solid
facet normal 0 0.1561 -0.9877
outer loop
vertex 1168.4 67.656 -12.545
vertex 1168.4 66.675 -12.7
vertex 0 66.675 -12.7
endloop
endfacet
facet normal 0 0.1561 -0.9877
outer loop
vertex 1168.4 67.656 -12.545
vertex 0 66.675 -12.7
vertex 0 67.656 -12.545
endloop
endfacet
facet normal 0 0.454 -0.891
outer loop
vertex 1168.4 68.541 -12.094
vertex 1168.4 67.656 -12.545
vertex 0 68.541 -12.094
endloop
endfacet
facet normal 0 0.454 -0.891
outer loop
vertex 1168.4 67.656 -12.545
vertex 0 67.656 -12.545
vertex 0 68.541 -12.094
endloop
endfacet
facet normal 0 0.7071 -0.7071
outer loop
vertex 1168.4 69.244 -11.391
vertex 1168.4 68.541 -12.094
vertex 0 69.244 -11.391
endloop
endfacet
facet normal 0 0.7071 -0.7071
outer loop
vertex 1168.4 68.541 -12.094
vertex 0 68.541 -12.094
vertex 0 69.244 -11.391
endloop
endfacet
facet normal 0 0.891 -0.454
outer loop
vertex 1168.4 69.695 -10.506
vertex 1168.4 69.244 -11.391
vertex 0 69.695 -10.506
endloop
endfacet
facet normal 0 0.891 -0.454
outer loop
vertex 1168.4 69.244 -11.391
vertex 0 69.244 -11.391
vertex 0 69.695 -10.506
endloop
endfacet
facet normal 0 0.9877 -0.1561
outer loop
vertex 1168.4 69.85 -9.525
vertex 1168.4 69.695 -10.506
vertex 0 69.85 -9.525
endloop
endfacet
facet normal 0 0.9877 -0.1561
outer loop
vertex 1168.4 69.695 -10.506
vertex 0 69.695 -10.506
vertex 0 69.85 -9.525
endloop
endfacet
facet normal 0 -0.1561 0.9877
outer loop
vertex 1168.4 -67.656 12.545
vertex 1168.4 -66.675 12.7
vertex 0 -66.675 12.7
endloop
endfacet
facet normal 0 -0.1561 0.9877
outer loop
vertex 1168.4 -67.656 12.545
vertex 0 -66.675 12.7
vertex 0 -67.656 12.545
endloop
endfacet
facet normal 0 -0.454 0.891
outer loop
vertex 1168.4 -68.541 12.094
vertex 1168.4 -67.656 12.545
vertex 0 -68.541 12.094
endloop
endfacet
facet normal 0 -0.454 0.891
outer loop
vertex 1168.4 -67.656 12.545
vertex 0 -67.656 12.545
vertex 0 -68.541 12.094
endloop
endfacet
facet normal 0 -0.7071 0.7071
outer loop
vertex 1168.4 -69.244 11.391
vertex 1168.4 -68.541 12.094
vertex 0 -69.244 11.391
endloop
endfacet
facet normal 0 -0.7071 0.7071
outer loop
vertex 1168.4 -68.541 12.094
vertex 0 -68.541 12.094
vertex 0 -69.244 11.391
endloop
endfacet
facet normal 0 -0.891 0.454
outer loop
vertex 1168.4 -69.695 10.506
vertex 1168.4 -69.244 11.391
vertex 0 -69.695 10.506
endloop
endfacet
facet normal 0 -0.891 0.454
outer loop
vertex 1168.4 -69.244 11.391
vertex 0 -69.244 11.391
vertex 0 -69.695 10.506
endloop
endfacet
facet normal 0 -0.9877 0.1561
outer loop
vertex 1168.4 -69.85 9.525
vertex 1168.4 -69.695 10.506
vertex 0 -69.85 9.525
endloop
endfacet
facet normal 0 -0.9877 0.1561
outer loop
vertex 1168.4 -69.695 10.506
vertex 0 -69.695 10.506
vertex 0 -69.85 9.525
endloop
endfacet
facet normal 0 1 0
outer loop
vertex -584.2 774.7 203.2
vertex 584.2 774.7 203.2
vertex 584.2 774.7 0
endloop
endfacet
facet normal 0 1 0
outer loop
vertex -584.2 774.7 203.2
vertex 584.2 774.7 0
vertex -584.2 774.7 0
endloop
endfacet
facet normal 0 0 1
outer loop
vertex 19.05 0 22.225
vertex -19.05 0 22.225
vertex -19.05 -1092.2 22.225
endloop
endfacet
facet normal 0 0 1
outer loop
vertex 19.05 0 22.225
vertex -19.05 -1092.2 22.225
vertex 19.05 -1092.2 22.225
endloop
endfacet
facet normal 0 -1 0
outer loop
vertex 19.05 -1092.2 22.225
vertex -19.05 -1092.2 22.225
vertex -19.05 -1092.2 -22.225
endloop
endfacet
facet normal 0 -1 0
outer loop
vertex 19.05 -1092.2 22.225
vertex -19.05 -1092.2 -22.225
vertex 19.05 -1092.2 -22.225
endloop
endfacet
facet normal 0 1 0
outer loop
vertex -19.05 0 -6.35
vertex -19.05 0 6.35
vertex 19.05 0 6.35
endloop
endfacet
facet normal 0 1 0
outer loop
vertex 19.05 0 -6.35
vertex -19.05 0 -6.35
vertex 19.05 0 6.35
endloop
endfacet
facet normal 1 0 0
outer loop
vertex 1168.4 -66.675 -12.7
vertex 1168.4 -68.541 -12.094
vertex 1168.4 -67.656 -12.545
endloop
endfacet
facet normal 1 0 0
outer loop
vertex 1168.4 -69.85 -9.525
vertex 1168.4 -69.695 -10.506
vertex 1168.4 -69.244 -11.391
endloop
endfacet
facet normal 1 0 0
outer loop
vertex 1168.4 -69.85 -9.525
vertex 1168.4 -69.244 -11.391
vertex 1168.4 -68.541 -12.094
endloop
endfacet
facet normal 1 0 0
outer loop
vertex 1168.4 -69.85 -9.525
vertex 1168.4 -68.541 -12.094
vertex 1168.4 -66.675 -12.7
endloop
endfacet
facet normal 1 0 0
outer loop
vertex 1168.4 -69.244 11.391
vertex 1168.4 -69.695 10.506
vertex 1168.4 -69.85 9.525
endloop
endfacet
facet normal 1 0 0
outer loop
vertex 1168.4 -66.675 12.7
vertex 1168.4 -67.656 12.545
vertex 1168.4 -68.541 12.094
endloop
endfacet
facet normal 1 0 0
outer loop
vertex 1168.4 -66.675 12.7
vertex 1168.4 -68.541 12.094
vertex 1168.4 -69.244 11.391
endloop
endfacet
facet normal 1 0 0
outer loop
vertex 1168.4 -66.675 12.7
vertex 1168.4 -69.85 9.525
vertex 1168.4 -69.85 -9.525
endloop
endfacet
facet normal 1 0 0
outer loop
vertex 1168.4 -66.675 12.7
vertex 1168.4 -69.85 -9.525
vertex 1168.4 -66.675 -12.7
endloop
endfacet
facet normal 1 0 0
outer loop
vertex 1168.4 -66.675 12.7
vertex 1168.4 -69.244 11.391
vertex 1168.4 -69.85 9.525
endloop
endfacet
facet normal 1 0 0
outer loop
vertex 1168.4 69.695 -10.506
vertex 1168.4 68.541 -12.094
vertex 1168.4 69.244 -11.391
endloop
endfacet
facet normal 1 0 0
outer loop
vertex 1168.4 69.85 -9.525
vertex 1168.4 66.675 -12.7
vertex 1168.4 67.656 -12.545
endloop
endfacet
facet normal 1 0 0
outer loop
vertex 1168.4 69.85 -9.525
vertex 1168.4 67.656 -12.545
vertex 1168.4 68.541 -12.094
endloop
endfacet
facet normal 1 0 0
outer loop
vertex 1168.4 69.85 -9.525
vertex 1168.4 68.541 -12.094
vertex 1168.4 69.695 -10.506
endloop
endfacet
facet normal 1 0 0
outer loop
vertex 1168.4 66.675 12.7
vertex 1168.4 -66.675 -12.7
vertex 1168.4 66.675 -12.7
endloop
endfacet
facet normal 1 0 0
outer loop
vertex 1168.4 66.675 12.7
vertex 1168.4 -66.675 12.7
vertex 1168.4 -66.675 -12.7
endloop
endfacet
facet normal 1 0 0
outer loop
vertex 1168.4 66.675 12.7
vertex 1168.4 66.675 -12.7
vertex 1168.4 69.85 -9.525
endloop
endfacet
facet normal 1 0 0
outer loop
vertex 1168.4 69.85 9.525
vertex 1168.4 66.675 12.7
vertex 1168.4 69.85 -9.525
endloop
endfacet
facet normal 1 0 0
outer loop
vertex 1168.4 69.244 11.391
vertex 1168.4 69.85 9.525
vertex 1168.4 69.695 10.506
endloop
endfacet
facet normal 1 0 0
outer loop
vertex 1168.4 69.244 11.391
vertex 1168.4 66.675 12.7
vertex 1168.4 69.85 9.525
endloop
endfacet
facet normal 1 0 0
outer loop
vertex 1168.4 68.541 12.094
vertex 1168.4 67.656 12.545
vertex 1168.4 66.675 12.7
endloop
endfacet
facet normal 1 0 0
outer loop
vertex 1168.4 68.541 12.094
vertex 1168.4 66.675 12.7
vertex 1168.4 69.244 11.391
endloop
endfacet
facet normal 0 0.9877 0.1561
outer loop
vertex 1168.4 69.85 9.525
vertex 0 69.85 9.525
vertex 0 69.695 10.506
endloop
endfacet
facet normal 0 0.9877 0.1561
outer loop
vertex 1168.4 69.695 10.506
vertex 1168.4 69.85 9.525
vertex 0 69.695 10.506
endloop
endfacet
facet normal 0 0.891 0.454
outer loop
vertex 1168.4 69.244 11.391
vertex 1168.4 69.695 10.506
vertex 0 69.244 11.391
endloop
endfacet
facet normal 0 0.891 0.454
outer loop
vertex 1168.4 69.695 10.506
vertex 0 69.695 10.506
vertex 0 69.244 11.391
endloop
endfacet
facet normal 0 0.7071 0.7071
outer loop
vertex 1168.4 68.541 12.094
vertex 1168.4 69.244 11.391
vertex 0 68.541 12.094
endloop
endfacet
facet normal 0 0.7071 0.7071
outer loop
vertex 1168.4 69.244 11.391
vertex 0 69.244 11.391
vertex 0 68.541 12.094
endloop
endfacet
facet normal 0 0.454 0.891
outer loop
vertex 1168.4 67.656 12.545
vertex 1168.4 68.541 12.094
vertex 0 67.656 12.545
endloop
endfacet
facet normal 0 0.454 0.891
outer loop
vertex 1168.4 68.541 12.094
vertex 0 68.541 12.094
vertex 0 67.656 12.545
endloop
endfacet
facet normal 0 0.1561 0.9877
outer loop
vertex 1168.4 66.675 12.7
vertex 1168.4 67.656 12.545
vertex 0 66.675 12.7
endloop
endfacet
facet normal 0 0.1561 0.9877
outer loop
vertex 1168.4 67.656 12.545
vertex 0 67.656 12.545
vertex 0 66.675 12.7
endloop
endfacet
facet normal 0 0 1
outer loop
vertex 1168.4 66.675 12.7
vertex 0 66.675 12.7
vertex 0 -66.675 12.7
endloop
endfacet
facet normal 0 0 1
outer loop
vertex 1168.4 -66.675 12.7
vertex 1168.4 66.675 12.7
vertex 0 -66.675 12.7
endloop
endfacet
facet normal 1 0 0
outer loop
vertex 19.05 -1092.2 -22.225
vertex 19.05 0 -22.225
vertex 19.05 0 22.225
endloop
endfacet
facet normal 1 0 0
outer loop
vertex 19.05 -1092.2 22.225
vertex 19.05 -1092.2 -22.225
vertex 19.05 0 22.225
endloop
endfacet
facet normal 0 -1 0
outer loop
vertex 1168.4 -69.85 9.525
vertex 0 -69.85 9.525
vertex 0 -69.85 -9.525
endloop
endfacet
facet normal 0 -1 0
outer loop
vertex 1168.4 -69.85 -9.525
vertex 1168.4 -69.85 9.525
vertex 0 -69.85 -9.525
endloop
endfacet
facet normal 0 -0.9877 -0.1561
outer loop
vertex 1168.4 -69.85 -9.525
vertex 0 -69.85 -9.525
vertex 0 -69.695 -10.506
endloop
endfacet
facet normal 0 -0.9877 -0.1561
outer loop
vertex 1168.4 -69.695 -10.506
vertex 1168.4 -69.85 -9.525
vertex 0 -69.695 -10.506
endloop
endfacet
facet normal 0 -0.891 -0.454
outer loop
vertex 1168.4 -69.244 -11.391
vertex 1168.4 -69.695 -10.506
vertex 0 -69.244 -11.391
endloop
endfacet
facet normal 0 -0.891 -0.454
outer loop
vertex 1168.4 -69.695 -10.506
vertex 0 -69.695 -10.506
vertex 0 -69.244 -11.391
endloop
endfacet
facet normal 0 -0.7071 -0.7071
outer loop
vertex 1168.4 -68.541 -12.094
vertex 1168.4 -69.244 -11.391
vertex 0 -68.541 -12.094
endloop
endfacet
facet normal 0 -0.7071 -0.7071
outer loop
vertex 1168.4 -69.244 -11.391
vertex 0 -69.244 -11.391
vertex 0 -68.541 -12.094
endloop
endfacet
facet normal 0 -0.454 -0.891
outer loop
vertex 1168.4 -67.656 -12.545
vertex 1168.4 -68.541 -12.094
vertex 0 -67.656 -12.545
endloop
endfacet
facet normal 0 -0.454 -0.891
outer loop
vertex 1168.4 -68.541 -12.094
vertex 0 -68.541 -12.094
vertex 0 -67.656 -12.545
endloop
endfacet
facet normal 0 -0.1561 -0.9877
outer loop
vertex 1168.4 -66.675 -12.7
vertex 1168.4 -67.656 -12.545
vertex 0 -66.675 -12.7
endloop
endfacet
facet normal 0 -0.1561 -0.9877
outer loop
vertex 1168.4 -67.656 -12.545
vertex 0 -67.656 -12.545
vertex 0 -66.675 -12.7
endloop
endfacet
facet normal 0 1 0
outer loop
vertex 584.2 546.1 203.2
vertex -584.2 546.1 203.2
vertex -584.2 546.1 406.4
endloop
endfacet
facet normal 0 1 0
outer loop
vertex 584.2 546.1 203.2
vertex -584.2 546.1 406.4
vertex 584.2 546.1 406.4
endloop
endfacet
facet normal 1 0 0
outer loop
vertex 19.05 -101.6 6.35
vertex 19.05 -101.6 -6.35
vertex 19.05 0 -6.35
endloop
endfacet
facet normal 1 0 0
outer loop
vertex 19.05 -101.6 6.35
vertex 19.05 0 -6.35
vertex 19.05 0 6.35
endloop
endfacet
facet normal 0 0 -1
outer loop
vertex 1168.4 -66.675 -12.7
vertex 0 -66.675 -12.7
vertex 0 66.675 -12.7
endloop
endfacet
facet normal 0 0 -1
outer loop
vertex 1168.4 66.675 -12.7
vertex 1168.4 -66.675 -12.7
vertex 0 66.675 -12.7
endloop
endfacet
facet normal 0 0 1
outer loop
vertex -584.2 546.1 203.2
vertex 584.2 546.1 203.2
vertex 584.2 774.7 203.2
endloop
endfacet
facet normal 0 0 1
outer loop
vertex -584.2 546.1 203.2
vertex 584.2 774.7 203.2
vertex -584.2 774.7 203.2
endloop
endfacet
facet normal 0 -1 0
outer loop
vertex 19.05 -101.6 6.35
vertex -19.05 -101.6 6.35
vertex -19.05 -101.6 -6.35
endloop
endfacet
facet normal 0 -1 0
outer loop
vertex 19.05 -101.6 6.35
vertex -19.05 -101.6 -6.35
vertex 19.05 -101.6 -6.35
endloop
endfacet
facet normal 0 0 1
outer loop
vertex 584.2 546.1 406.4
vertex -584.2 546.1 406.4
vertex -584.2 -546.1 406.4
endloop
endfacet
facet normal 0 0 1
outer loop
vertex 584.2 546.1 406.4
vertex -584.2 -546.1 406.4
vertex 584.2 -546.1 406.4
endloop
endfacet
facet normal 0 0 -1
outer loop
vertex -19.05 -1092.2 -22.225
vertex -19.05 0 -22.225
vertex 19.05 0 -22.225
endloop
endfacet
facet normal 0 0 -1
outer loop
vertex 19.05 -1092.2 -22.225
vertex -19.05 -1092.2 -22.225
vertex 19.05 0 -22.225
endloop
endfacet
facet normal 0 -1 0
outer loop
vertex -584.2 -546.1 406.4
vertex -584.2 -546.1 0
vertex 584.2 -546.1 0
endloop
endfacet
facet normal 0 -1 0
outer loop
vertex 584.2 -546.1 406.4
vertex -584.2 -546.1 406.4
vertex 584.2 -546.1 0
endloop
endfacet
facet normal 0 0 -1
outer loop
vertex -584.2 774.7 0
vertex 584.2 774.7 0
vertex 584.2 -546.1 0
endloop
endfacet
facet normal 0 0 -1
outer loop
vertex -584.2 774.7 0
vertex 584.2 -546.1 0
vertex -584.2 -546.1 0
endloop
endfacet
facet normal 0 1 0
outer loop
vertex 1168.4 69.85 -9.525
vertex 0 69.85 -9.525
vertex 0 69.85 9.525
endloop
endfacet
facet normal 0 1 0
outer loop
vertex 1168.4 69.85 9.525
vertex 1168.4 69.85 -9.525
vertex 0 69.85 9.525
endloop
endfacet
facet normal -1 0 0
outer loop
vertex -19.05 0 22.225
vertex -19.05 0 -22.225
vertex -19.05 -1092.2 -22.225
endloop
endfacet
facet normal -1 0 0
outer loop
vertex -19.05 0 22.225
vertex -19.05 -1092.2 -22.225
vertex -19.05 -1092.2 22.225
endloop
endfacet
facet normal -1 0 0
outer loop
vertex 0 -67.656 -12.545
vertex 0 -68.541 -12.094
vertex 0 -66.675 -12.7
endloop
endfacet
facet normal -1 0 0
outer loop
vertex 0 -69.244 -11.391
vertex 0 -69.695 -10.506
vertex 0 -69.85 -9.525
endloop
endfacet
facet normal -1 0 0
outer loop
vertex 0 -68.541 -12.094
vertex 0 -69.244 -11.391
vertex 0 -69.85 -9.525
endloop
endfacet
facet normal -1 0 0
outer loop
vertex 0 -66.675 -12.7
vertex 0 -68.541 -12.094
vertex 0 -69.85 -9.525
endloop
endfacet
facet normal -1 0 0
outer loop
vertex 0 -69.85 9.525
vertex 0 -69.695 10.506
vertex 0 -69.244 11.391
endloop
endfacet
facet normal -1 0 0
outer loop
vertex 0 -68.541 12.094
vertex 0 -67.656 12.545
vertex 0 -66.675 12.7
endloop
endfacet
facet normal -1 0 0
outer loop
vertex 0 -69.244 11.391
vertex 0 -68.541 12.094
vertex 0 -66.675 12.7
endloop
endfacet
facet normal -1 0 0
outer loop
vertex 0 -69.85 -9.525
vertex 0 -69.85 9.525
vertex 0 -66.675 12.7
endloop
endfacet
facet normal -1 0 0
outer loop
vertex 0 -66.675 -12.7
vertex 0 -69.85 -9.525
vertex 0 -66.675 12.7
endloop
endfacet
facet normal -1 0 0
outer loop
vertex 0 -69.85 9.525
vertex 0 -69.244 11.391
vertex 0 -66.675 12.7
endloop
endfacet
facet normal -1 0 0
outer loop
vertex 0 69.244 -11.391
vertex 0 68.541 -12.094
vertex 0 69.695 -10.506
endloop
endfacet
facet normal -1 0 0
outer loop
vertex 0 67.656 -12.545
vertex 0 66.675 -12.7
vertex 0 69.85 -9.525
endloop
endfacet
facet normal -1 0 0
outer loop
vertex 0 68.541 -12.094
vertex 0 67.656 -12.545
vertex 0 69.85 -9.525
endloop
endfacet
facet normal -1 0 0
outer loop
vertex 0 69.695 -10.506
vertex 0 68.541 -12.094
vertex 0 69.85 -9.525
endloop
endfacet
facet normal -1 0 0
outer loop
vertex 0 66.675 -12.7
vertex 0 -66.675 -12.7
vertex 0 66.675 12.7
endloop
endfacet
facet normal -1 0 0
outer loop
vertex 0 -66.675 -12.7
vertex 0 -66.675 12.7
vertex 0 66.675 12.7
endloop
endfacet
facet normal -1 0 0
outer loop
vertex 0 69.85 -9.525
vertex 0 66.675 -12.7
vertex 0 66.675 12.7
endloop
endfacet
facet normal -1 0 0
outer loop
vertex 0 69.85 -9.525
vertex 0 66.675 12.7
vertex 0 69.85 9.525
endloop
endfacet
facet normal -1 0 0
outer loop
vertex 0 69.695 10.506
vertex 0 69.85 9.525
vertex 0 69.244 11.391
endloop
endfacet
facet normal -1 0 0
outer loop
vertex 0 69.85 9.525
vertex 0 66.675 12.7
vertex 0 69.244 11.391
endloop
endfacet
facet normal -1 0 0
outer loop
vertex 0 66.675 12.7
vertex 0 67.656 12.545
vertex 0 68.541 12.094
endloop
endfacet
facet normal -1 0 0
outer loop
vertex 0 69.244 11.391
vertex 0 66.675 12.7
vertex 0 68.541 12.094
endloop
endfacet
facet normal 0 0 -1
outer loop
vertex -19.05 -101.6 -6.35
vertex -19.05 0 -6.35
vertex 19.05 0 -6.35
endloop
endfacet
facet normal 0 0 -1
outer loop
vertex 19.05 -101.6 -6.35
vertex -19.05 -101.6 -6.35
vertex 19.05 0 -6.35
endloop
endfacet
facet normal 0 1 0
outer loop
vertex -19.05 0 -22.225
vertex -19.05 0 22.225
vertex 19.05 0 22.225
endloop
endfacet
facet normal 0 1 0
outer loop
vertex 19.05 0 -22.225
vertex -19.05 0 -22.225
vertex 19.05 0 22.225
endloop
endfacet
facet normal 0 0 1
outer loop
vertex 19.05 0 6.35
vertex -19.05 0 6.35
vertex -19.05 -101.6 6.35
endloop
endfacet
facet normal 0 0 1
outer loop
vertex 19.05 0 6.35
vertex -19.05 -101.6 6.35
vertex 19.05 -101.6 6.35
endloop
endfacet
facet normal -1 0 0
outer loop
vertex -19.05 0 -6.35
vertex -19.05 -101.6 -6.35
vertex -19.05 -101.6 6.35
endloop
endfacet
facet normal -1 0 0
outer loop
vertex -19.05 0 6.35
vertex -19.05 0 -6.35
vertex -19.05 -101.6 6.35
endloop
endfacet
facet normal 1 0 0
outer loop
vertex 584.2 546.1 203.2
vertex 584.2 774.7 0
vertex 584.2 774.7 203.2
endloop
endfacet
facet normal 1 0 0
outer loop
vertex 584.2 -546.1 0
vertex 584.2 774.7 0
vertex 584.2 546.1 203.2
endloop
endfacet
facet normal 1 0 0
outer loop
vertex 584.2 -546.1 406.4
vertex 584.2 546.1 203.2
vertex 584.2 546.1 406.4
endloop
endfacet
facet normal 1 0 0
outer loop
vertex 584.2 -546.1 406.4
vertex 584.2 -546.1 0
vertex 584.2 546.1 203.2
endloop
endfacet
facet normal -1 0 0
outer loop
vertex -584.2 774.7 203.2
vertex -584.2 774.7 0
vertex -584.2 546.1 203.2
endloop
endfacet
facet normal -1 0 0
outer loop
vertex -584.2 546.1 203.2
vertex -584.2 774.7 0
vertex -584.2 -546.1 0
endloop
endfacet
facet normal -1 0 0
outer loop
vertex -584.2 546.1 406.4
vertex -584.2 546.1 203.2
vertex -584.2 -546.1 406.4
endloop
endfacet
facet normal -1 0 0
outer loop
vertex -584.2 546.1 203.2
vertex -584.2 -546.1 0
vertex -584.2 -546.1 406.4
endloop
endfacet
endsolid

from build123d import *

# Parameters (mm, degrees)
F0_W     = 38.1
F0_H     = 12.7
F1_DEPTH = 101.6
F2_W     = 38.1
F2_H     = 44.45
F3_DEPTH = 1092.2
F5_DEPTH = 1168.4
F6_W     = 1168.4
F6_H     = 1092.2
F7_DEPTH = 406.4
F8_W     = 1168.4
F8_H     = 203.2
F9_DEPTH = 228.6


with BuildPart() as f1:
    # F0 (on Front) → F1 (new body)
    with BuildSketch(Plane.XZ):
        Rectangle(F0_W, F0_H)
    extrude(amount=F1_DEPTH)


with BuildPart() as f3:
    # F2 (on Front) → F3 (new body)
    with BuildSketch(Plane.XZ):
        Rectangle(F2_W, F2_H)
    extrude(amount=F3_DEPTH)


with BuildPart() as f5:
    # F4 (on Right) → F5 (new body)
    with BuildSketch(Plane.YZ):
        with BuildLine():
            Line((-66.675, -12.7), (66.675, -12.7))
            ThreePointArc((66.675, -12.7), (68.920064, -11.770064), (69.85, -9.525))
            Line((69.85, -9.525), (69.85, 9.525))
            ThreePointArc((69.85, 9.525), (68.920064, 11.770064), (66.675, 12.7))
            Line((66.675, 12.7), (-66.675, 12.7))
            ThreePointArc((-66.675, 12.7), (-68.920064, 11.770064), (-69.85, 9.525))
            Line((-69.85, 9.525), (-69.85, -9.525))
            ThreePointArc((-69.85, -9.525), (-68.920064, -11.770064), (-66.675, -12.7))
        make_face()
    extrude(amount=F5_DEPTH)


with BuildPart() as f7:
    # F6 (on Top) → F7 (new body)
    with BuildSketch(Plane.XY):
        Rectangle(F6_W, F6_H)
    extrude(amount=F7_DEPTH)

    # F8 (on face) → F9 (join)
    with BuildSketch(Plane(origin=(0, 546.1, 0), x_dir=(-1, 0, 0), z_dir=(0, 1, 0))):
        with Locations((0, 101.6)):
            Rectangle(F8_W, F8_H)
    extrude(amount=F9_DEPTH)


solid = Compound([f1.part, f3.part, f5.part, f7.part])
